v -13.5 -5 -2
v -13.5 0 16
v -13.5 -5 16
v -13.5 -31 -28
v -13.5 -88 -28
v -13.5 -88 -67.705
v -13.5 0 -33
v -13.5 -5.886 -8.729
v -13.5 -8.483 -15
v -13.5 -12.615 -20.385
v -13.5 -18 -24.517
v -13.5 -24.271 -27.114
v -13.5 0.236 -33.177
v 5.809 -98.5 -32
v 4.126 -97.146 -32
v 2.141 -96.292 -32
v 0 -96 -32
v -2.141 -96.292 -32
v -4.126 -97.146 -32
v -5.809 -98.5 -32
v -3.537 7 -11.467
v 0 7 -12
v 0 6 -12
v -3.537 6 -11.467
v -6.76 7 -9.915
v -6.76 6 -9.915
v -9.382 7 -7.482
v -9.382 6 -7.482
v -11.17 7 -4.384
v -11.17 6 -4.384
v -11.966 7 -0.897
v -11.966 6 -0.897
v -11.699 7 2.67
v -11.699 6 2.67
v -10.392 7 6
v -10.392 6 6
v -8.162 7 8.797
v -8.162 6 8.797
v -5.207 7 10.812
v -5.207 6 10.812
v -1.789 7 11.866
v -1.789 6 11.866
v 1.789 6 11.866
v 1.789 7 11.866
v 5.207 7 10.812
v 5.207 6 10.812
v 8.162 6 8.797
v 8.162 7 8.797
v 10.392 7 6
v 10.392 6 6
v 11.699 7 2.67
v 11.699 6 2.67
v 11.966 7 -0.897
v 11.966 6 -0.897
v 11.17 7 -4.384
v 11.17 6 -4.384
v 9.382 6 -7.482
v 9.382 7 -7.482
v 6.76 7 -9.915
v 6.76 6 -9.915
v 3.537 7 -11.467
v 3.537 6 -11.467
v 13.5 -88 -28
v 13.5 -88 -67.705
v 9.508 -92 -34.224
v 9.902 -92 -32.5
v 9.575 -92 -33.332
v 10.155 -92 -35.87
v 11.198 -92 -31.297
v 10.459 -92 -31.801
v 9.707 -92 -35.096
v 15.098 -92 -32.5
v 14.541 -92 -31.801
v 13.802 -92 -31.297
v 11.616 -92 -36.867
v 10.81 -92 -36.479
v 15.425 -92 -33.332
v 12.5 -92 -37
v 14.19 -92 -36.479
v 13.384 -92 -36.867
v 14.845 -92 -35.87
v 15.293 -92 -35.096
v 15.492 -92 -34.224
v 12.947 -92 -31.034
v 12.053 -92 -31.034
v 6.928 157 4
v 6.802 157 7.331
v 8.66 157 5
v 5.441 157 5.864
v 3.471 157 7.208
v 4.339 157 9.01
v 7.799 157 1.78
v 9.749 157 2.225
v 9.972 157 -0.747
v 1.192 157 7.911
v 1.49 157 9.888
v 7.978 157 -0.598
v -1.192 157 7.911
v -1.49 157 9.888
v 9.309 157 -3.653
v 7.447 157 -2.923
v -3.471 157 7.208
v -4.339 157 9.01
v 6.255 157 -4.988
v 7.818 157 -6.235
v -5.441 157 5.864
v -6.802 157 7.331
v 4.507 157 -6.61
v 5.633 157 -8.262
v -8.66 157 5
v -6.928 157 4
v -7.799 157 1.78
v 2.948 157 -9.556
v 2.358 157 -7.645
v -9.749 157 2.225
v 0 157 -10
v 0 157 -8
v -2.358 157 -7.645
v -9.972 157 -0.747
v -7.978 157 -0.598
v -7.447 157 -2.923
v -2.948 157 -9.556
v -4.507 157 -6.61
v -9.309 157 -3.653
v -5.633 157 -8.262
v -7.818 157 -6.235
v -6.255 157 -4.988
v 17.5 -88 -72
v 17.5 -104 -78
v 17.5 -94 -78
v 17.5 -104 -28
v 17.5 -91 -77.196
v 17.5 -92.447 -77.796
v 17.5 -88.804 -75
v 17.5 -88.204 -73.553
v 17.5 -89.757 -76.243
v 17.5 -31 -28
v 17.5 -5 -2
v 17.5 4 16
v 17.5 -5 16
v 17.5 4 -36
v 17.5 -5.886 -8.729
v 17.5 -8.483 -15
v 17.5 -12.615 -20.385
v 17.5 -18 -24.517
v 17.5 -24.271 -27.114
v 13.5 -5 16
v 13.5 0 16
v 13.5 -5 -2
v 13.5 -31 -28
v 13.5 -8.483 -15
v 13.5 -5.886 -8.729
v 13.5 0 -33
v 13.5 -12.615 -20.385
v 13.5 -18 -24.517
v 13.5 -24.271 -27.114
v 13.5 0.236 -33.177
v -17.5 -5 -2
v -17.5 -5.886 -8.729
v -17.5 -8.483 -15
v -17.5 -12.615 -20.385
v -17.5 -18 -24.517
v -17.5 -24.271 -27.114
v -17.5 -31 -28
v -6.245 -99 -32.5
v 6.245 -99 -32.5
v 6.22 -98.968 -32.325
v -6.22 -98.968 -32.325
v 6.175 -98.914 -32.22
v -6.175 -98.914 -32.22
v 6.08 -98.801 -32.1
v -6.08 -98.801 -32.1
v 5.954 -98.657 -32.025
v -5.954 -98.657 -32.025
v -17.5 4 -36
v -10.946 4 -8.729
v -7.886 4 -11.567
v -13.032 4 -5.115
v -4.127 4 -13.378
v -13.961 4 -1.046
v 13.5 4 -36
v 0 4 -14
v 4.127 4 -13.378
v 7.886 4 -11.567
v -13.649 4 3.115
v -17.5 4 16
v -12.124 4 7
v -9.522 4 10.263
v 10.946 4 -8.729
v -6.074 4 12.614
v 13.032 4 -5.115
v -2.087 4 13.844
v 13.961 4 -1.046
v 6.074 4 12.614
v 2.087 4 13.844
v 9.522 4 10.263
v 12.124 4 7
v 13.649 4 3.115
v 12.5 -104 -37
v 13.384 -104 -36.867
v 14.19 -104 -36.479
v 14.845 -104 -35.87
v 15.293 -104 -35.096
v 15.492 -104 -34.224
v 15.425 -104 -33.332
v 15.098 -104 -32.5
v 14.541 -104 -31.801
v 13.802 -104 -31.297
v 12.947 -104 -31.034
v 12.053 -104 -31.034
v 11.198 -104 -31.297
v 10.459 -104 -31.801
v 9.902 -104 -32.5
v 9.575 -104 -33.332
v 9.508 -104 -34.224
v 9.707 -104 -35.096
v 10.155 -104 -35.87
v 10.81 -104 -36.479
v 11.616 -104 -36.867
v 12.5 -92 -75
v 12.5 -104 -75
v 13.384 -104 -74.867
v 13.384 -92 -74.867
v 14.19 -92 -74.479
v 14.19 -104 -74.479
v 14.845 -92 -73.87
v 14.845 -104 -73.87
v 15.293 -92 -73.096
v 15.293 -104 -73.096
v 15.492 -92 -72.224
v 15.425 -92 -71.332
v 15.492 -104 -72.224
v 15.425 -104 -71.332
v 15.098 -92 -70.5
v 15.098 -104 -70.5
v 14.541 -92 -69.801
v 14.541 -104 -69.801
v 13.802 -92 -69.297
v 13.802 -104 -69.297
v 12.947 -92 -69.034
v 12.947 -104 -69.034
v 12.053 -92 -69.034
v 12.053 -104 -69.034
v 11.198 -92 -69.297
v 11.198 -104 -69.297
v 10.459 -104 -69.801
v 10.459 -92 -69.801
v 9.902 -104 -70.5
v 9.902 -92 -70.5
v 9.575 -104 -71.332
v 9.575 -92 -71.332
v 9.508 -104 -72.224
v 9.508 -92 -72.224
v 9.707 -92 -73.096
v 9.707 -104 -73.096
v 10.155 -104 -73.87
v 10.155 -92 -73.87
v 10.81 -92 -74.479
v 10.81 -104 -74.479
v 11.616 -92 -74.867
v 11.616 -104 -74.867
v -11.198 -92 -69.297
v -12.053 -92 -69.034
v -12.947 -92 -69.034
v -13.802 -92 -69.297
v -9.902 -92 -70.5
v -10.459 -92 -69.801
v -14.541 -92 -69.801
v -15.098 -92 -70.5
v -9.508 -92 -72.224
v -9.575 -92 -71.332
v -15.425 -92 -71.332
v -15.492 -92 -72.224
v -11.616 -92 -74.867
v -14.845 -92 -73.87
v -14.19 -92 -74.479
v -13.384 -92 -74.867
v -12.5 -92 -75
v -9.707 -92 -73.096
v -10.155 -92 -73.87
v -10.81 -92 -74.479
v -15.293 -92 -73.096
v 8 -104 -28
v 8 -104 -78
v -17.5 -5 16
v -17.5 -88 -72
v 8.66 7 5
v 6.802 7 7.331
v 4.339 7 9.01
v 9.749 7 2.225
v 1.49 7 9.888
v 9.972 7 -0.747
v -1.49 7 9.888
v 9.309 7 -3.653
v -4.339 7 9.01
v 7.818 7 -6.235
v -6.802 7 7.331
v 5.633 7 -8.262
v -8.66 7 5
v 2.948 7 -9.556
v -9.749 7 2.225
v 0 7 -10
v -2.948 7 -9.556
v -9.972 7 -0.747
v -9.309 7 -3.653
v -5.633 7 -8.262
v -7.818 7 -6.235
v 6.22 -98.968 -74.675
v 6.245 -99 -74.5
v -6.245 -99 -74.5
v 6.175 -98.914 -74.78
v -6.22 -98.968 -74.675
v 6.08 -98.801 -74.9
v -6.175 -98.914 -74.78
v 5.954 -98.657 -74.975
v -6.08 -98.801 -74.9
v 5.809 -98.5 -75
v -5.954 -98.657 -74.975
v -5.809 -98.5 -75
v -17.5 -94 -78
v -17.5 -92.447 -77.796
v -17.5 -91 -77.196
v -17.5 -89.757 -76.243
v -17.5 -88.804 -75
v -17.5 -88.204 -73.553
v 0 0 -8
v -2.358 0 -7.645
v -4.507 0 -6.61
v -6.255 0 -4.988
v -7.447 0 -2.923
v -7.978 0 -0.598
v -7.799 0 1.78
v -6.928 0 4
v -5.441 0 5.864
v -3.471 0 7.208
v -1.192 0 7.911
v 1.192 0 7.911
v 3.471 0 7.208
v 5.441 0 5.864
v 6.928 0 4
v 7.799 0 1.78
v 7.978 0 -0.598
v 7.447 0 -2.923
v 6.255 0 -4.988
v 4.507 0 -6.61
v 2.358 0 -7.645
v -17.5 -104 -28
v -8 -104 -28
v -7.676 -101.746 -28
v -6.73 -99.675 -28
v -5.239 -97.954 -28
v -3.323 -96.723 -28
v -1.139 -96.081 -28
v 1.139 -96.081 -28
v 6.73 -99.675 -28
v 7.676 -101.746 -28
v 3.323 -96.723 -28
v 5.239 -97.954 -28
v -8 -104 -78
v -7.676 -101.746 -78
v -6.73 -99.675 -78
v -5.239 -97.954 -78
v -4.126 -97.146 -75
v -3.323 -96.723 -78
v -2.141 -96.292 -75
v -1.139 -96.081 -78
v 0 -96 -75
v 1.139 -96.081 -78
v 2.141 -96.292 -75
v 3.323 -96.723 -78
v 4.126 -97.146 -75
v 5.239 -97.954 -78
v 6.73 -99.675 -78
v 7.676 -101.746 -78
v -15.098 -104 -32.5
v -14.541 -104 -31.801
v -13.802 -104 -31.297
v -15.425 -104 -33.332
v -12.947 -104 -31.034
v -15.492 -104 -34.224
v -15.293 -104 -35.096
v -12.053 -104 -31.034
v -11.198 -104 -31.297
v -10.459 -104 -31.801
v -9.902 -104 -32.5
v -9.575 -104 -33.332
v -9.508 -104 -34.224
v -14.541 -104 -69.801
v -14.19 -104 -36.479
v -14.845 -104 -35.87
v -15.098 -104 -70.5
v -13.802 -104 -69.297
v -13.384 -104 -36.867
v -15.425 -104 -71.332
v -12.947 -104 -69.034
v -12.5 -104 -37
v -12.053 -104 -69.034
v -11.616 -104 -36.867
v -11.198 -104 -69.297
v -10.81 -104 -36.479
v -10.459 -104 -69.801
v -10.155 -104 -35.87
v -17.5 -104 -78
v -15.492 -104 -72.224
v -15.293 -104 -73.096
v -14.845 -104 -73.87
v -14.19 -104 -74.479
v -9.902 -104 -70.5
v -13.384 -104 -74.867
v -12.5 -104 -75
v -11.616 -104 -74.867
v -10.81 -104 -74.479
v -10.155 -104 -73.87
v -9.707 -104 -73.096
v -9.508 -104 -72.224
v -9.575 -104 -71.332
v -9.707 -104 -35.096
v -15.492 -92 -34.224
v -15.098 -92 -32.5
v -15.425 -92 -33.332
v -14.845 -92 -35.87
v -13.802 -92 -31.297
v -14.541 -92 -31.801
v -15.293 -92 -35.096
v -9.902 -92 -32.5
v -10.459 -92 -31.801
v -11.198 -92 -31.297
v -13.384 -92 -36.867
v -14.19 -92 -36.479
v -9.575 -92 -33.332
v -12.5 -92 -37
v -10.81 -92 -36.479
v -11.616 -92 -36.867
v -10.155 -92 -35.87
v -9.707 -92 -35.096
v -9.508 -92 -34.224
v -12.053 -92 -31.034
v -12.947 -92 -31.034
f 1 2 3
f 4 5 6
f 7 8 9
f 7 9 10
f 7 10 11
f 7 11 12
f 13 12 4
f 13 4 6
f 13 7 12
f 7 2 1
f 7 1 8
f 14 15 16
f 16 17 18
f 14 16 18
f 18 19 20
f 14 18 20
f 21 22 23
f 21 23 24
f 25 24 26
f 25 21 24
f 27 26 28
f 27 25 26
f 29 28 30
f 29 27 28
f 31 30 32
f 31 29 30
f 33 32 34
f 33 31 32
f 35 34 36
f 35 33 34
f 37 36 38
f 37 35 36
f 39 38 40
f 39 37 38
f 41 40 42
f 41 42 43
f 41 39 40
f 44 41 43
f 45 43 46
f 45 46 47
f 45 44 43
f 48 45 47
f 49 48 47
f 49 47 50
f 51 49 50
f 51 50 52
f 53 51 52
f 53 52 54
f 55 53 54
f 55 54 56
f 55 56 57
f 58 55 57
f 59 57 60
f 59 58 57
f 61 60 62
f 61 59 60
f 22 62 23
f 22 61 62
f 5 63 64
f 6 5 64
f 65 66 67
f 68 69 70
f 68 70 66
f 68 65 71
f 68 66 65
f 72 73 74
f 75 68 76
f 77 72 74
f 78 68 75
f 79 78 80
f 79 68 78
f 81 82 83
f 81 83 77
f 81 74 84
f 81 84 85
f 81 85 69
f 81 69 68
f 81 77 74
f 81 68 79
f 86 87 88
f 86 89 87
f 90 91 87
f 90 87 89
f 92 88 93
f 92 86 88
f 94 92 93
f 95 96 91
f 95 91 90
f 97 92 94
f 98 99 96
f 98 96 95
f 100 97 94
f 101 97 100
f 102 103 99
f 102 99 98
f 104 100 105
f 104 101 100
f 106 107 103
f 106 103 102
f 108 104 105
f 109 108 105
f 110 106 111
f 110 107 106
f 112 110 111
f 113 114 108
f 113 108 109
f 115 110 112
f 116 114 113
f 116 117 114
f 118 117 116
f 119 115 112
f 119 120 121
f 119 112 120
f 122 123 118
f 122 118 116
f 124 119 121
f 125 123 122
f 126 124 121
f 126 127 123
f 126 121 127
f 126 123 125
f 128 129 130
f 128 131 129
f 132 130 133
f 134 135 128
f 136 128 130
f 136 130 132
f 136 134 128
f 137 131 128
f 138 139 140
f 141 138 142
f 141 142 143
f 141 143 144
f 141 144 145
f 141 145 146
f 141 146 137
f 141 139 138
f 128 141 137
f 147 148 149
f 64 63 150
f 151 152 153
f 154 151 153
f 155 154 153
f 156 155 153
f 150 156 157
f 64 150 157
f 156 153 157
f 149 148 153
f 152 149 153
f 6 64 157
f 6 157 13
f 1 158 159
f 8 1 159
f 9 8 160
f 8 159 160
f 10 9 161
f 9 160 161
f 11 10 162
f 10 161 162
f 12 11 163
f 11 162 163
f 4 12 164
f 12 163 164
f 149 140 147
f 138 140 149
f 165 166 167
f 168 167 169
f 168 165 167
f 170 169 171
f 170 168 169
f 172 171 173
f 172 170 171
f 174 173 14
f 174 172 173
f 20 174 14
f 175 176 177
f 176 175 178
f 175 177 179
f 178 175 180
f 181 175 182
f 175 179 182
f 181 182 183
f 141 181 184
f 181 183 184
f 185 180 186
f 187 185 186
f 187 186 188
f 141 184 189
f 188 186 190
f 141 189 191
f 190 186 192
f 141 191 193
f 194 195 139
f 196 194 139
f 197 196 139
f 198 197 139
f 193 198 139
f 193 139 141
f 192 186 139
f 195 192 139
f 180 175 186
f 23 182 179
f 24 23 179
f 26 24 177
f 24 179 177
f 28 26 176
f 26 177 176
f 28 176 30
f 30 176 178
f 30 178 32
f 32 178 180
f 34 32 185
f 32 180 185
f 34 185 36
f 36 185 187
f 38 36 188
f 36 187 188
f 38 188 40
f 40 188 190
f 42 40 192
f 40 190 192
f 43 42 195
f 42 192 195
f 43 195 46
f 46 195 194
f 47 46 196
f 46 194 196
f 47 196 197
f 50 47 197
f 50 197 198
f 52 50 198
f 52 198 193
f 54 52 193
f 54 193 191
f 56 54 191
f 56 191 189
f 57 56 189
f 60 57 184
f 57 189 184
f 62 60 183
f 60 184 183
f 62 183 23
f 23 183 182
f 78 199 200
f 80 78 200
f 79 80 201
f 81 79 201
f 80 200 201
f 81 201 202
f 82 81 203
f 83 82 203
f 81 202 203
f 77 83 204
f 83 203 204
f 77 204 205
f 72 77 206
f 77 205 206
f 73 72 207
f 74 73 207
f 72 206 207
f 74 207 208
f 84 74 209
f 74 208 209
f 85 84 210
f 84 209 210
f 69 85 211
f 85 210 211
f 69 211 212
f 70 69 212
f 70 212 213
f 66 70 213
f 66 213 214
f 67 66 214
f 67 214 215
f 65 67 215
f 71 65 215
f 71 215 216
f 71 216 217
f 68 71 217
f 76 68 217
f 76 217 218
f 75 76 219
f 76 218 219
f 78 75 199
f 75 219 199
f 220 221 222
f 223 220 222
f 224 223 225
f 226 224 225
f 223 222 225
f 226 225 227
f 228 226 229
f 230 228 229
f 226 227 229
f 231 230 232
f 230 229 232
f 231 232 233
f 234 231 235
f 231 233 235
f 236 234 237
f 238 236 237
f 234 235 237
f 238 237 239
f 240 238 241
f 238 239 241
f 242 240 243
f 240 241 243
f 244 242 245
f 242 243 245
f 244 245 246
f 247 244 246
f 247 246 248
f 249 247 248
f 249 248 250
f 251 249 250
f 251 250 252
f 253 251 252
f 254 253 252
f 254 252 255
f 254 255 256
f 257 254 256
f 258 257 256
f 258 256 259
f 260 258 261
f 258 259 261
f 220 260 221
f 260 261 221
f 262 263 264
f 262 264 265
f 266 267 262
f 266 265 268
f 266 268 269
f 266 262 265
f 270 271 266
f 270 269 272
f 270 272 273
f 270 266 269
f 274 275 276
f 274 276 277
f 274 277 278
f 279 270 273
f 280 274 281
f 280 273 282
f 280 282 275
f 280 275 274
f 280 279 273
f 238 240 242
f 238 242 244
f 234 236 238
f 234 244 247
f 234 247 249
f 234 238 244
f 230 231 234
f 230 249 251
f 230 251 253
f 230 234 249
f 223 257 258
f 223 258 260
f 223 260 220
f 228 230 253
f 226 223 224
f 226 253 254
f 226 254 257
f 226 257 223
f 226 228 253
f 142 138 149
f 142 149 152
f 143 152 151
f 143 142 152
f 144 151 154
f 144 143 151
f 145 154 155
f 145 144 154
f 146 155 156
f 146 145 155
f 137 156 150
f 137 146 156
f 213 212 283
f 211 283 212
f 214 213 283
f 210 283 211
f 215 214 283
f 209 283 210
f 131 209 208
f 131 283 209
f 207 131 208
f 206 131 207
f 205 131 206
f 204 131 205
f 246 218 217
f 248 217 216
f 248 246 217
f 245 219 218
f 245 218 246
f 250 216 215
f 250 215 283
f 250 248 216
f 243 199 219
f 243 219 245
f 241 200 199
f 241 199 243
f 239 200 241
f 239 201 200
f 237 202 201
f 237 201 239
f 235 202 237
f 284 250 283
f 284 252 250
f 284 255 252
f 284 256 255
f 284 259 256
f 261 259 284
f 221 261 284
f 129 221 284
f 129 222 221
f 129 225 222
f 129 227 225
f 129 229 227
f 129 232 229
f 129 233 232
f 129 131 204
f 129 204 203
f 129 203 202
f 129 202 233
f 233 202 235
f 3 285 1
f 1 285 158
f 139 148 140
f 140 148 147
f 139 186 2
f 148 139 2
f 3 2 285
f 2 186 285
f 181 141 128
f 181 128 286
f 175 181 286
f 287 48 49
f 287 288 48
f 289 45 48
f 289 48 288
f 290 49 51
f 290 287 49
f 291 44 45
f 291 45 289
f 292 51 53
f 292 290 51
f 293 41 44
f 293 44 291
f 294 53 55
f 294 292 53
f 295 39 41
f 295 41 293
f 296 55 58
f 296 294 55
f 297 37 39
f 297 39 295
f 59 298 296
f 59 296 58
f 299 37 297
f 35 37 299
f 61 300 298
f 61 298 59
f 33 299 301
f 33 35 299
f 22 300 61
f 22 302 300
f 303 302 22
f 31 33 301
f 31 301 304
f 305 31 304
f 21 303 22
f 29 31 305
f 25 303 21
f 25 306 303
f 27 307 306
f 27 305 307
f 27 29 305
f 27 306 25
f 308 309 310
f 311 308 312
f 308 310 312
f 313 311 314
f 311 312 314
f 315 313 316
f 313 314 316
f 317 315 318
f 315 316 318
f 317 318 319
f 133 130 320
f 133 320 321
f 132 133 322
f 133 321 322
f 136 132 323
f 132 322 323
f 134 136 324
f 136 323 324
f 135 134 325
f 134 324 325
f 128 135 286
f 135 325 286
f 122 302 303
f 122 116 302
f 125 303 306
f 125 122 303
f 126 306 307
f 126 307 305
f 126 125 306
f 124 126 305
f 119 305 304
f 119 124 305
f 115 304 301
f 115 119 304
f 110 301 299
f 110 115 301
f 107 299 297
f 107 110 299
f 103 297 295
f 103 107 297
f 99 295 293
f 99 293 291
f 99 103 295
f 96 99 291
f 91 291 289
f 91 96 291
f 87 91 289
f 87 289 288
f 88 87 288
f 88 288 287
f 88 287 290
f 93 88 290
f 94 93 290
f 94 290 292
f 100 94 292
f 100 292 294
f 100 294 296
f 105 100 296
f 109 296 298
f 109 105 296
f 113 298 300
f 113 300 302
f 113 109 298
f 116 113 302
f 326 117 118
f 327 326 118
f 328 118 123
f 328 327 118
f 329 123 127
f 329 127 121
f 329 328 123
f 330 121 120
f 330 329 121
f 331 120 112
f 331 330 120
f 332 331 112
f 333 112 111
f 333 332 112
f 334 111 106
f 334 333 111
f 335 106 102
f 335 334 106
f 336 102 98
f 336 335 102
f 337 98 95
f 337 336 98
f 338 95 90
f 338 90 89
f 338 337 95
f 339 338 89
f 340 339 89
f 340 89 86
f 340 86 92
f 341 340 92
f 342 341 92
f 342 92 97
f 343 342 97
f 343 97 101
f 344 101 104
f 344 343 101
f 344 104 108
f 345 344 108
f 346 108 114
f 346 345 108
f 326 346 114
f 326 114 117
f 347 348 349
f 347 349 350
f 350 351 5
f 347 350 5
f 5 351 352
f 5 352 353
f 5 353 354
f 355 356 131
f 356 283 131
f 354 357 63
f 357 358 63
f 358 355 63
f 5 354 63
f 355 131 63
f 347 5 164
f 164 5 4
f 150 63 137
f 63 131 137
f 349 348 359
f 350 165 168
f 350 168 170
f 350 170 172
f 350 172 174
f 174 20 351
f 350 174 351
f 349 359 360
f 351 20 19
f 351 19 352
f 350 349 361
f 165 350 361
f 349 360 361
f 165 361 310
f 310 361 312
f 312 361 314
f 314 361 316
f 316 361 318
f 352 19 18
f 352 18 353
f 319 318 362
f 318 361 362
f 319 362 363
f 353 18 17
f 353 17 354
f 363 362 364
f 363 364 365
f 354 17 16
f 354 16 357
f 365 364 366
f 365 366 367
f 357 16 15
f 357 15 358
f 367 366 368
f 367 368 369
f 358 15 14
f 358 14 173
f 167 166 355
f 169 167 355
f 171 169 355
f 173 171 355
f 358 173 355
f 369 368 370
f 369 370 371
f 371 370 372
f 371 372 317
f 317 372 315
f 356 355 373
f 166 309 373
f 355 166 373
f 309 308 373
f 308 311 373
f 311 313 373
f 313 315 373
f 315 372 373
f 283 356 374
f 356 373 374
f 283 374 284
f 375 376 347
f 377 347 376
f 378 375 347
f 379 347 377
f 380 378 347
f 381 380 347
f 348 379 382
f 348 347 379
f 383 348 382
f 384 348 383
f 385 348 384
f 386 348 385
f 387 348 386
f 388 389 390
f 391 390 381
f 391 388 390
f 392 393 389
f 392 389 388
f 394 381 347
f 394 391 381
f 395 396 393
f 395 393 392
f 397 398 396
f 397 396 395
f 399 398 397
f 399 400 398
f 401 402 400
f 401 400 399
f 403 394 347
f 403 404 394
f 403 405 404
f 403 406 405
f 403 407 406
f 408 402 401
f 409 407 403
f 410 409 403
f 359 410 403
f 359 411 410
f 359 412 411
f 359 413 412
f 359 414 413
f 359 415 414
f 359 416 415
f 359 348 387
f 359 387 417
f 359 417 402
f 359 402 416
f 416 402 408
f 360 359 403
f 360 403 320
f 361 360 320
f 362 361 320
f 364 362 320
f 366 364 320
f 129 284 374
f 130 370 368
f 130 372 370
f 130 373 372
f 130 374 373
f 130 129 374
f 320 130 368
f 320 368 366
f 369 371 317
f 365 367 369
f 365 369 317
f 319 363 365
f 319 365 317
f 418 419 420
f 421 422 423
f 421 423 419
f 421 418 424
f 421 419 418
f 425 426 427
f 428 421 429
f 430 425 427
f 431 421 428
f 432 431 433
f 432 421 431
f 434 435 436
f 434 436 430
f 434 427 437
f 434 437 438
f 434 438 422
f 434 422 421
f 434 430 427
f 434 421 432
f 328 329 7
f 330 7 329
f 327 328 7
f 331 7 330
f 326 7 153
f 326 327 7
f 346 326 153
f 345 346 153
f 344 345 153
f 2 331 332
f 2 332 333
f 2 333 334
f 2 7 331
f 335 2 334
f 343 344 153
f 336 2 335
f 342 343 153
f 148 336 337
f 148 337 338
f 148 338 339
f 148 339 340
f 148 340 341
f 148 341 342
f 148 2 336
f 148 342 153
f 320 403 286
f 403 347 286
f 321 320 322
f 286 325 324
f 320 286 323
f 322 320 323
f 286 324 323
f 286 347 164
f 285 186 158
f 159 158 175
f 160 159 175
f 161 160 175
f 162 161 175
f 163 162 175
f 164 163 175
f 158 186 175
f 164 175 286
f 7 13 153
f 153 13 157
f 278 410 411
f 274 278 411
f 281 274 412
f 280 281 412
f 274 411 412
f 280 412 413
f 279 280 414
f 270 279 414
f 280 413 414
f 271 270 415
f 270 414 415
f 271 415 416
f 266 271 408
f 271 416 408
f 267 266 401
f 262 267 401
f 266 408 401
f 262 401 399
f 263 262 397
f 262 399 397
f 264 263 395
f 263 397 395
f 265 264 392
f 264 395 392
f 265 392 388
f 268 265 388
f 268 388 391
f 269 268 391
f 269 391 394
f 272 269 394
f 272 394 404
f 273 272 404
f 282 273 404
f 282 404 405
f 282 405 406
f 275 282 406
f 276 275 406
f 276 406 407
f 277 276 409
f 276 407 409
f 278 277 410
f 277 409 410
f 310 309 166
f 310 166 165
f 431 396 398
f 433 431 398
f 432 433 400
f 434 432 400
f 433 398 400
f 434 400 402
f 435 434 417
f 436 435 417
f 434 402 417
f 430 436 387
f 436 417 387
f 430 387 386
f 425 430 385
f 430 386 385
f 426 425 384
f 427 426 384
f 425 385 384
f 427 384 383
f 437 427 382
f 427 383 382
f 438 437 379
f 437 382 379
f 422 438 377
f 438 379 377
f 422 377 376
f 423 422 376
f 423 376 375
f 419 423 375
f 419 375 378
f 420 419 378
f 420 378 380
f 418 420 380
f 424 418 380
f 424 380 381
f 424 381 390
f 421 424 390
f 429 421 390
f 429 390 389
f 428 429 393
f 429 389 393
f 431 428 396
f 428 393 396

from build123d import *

# Parameters (mm, degrees)
SKETCH2_W           = 50
SKETCH2_H           = 16
BOSS_EXTRUDE1_DEPTH = 17.5
SKETCH3_R           = 8
CUT_EXTRUDE1_DEPTH  = 182.811028268
BOSS_EXTRUDE2_START = -3
SKETCH4_W           = 16
SKETCH4_H           = 3
BOSS_EXTRUDE2_DEPTH = 43
FILLET1_R           = 0.5
FILLET2_R           = 6
SKETCH6_R           = 3
CUT_EXTRUDE3_DEPTH  = 12
BOSS_EXTRUDE3_DEPTH = 4
BOSS_EXTRUDE5_START = -35
BOSS_EXTRUDE5_DEPTH = 4
SKETCH8_W           = 27
SKETCH8_H           = 52
SKETCH8_R           = 10
BOSS_EXTRUDE6_DEPTH = 4
CHAMFER1_SIZE2      = 4
CHAMFER1_SIZE       = 3
SKETCH9_W           = 27
SKETCH9_H           = 98.792712282
BOSS_EXTRUDE7_DEPTH = 4
CHAMFER2_SIZE       = 2


with BuildPart() as part:
    # Sketch1 → Revolve1 (revolve)
    with BuildSketch(Plane(origin=(0, 0, 0), x_dir=(0, 0, -1), z_dir=(1, 0, 0))):
        Polygon((8, 157), (8, 0), (10, 0), (10, 4), (12, 4), (12, 7), (10, 7), (10, 157), align=None)
    revolve(axis=Axis((0, 0, 0), (0, 1, 0)))



with BuildPart() as body_2:
    # Sketch2 → Boss-Extrude1 (new, symmetric)
    with BuildSketch(Plane(origin=(0, 0, 0), x_dir=(0, 0, -1), z_dir=(1, 0, 0))):
        with Locations((53, -96)):
            Rectangle(SKETCH2_W, SKETCH2_H)
    extrude(amount=BOSS_EXTRUDE1_DEPTH, both=True)

    # Sketch3 → Cut-Extrude1 (cut, through all)
    with BuildSketch(Plane(origin=(0, 0, -78), x_dir=(-1, 0, 0), z_dir=(0, 0, -1))):
        with Locations((0, -104)):
            Circle(SKETCH3_R)
    extrude(amount=-CUT_EXTRUDE1_DEPTH, mode=Mode.SUBTRACT)

    # Sketch4 → Boss-Extrude2 (add)
    with BuildSketch(Plane(origin=(0, 0, -78), x_dir=(-1, 0, 0), z_dir=(0, 0, -1)).offset(BOSS_EXTRUDE2_START)):
        with Locations((0, -97.5)):
            Rectangle(SKETCH4_W, SKETCH4_H)
    extrude(amount=-BOSS_EXTRUDE2_DEPTH)

    # Fillet1
    fillet1_edges = [body_2.edges().sort_by_distance(p)[0] for p in [
        (0, -99, -32),
        (0, -99, -75),
    ]]
    fillet(fillet1_edges, radius=FILLET1_R)

    # Fillet2
    fillet2_edges = [body_2.edges().sort_by_distance(p)[0] for p in [
        (0, -88, -78),
    ]]
    fillet(fillet2_edges, radius=FILLET2_R)

    # Sketch6 → Cut-Extrude3 (cut)
    with BuildSketch(Plane.XZ.offset(104)):
        with Locations(Location((-12.5, -34, 0), (0, 0, 270))):
            Circle(SKETCH6_R)
        with Locations(Location((12.5, -34, 0), (0, 0, 270))):
            Circle(SKETCH6_R)
        with Locations(Location((-12.5, -72, 0), (0, 0, 270))):
            Circle(SKETCH6_R)
        with Locations(Location((12.5, -72, 0), (0, 0, 270))):
            Circle(SKETCH6_R)
    extrude(amount=-CUT_EXTRUDE3_DEPTH, mode=Mode.SUBTRACT)


with BuildPart() as body_3:
    # Sketch7 → Boss-Extrude3 (new body)
    with BuildSketch(Plane.ZY.offset(17.5)):
        with BuildLine():
            Line((-72, -88), (-36, 4))
            Line((-36, 4), (16, 4))
            Line((16, 4), (16, -5))
            Line((16, -5), (-2, -5))
            ThreePointArc((-2, -5), (-20.384776311, -12.615223689), (-28, -31))
            Line((-28, -31), (-28, -88))
            Line((-28, -88), (-72, -88))
        make_face()
    extrude(amount=-BOSS_EXTRUDE3_DEPTH)


with BuildPart() as body_4:
    # Sketch7<2> → Boss-Extrude5 (new body)
    with BuildSketch(Plane.ZY.offset(17.5).offset(BOSS_EXTRUDE5_START)):
        with BuildLine():
            Line((-72, -88), (-36, 4))
            Line((-36, 4), (16, 4))
            Line((16, 4), (16, -5))
            Line((16, -5), (-2, -5))
            ThreePointArc((-2, -5), (-20.384776311, -12.615223689), (-28, -31))
            Line((-28, -31), (-28, -88))
            Line((-28, -88), (-72, -88))
        make_face()
    extrude(amount=BOSS_EXTRUDE5_DEPTH)


with BuildPart() as part_1:
    add(part.part)

    add(body_3.part)  # Boss-Extrude6 merges body 3

    add(body_4.part)  # Boss-Extrude6 merges body 4
    # Sketch8 → Boss-Extrude6 (add)
    with BuildSketch(Plane.XZ.offset(-4)):
        with Locations((0, -10)):
            Rectangle(SKETCH8_W, SKETCH8_H)
        with Locations(Location((0, 0, 0), (0, 0, 270))):
            Circle(SKETCH8_R, mode=Mode.SUBTRACT)
    extrude(amount=BOSS_EXTRUDE6_DEPTH)

    # Chamfer1
    chamfer1_edges = [part_1.edges().sort_by_distance(p)[0] for p in [
        (0, 0, -36),
    ]]
    chamfer1_side = [part_1.faces().sort_by_distance(p)[0] for p in [
        (0, 0, -35.94),
    ]]
    chamfer(chamfer1_edges, length=CHAMFER1_SIZE - 0.0001, length2=CHAMFER1_SIZE2 - 0.0001, reference=chamfer1_side[0])  # a hair under: the kernel refuses the full size


    add(body_2.part)  # Boss-Extrude7 merges body 2
    # Sketch9 → Boss-Extrude7 (add)
    with BuildSketch(Plane(origin=(0, 12.747540984, -32.57704918), x_dir=(-1, 0, 0), z_dir=(0, 0.3643993485805124, -0.9312427797057534))):
        with Locations((0, -58.789761571)):
            Rectangle(SKETCH9_W, SKETCH9_H)
    extrude(amount=-BOSS_EXTRUDE7_DEPTH)

    # Chamfer2
    chamfer2_edges = [part_1.edges().sort_by_distance(p)[0] for p in [
        (0, 4, 12),
    ]]
    chamfer(chamfer2_edges, length=CHAMFER2_SIZE)


solid = part_1.part
